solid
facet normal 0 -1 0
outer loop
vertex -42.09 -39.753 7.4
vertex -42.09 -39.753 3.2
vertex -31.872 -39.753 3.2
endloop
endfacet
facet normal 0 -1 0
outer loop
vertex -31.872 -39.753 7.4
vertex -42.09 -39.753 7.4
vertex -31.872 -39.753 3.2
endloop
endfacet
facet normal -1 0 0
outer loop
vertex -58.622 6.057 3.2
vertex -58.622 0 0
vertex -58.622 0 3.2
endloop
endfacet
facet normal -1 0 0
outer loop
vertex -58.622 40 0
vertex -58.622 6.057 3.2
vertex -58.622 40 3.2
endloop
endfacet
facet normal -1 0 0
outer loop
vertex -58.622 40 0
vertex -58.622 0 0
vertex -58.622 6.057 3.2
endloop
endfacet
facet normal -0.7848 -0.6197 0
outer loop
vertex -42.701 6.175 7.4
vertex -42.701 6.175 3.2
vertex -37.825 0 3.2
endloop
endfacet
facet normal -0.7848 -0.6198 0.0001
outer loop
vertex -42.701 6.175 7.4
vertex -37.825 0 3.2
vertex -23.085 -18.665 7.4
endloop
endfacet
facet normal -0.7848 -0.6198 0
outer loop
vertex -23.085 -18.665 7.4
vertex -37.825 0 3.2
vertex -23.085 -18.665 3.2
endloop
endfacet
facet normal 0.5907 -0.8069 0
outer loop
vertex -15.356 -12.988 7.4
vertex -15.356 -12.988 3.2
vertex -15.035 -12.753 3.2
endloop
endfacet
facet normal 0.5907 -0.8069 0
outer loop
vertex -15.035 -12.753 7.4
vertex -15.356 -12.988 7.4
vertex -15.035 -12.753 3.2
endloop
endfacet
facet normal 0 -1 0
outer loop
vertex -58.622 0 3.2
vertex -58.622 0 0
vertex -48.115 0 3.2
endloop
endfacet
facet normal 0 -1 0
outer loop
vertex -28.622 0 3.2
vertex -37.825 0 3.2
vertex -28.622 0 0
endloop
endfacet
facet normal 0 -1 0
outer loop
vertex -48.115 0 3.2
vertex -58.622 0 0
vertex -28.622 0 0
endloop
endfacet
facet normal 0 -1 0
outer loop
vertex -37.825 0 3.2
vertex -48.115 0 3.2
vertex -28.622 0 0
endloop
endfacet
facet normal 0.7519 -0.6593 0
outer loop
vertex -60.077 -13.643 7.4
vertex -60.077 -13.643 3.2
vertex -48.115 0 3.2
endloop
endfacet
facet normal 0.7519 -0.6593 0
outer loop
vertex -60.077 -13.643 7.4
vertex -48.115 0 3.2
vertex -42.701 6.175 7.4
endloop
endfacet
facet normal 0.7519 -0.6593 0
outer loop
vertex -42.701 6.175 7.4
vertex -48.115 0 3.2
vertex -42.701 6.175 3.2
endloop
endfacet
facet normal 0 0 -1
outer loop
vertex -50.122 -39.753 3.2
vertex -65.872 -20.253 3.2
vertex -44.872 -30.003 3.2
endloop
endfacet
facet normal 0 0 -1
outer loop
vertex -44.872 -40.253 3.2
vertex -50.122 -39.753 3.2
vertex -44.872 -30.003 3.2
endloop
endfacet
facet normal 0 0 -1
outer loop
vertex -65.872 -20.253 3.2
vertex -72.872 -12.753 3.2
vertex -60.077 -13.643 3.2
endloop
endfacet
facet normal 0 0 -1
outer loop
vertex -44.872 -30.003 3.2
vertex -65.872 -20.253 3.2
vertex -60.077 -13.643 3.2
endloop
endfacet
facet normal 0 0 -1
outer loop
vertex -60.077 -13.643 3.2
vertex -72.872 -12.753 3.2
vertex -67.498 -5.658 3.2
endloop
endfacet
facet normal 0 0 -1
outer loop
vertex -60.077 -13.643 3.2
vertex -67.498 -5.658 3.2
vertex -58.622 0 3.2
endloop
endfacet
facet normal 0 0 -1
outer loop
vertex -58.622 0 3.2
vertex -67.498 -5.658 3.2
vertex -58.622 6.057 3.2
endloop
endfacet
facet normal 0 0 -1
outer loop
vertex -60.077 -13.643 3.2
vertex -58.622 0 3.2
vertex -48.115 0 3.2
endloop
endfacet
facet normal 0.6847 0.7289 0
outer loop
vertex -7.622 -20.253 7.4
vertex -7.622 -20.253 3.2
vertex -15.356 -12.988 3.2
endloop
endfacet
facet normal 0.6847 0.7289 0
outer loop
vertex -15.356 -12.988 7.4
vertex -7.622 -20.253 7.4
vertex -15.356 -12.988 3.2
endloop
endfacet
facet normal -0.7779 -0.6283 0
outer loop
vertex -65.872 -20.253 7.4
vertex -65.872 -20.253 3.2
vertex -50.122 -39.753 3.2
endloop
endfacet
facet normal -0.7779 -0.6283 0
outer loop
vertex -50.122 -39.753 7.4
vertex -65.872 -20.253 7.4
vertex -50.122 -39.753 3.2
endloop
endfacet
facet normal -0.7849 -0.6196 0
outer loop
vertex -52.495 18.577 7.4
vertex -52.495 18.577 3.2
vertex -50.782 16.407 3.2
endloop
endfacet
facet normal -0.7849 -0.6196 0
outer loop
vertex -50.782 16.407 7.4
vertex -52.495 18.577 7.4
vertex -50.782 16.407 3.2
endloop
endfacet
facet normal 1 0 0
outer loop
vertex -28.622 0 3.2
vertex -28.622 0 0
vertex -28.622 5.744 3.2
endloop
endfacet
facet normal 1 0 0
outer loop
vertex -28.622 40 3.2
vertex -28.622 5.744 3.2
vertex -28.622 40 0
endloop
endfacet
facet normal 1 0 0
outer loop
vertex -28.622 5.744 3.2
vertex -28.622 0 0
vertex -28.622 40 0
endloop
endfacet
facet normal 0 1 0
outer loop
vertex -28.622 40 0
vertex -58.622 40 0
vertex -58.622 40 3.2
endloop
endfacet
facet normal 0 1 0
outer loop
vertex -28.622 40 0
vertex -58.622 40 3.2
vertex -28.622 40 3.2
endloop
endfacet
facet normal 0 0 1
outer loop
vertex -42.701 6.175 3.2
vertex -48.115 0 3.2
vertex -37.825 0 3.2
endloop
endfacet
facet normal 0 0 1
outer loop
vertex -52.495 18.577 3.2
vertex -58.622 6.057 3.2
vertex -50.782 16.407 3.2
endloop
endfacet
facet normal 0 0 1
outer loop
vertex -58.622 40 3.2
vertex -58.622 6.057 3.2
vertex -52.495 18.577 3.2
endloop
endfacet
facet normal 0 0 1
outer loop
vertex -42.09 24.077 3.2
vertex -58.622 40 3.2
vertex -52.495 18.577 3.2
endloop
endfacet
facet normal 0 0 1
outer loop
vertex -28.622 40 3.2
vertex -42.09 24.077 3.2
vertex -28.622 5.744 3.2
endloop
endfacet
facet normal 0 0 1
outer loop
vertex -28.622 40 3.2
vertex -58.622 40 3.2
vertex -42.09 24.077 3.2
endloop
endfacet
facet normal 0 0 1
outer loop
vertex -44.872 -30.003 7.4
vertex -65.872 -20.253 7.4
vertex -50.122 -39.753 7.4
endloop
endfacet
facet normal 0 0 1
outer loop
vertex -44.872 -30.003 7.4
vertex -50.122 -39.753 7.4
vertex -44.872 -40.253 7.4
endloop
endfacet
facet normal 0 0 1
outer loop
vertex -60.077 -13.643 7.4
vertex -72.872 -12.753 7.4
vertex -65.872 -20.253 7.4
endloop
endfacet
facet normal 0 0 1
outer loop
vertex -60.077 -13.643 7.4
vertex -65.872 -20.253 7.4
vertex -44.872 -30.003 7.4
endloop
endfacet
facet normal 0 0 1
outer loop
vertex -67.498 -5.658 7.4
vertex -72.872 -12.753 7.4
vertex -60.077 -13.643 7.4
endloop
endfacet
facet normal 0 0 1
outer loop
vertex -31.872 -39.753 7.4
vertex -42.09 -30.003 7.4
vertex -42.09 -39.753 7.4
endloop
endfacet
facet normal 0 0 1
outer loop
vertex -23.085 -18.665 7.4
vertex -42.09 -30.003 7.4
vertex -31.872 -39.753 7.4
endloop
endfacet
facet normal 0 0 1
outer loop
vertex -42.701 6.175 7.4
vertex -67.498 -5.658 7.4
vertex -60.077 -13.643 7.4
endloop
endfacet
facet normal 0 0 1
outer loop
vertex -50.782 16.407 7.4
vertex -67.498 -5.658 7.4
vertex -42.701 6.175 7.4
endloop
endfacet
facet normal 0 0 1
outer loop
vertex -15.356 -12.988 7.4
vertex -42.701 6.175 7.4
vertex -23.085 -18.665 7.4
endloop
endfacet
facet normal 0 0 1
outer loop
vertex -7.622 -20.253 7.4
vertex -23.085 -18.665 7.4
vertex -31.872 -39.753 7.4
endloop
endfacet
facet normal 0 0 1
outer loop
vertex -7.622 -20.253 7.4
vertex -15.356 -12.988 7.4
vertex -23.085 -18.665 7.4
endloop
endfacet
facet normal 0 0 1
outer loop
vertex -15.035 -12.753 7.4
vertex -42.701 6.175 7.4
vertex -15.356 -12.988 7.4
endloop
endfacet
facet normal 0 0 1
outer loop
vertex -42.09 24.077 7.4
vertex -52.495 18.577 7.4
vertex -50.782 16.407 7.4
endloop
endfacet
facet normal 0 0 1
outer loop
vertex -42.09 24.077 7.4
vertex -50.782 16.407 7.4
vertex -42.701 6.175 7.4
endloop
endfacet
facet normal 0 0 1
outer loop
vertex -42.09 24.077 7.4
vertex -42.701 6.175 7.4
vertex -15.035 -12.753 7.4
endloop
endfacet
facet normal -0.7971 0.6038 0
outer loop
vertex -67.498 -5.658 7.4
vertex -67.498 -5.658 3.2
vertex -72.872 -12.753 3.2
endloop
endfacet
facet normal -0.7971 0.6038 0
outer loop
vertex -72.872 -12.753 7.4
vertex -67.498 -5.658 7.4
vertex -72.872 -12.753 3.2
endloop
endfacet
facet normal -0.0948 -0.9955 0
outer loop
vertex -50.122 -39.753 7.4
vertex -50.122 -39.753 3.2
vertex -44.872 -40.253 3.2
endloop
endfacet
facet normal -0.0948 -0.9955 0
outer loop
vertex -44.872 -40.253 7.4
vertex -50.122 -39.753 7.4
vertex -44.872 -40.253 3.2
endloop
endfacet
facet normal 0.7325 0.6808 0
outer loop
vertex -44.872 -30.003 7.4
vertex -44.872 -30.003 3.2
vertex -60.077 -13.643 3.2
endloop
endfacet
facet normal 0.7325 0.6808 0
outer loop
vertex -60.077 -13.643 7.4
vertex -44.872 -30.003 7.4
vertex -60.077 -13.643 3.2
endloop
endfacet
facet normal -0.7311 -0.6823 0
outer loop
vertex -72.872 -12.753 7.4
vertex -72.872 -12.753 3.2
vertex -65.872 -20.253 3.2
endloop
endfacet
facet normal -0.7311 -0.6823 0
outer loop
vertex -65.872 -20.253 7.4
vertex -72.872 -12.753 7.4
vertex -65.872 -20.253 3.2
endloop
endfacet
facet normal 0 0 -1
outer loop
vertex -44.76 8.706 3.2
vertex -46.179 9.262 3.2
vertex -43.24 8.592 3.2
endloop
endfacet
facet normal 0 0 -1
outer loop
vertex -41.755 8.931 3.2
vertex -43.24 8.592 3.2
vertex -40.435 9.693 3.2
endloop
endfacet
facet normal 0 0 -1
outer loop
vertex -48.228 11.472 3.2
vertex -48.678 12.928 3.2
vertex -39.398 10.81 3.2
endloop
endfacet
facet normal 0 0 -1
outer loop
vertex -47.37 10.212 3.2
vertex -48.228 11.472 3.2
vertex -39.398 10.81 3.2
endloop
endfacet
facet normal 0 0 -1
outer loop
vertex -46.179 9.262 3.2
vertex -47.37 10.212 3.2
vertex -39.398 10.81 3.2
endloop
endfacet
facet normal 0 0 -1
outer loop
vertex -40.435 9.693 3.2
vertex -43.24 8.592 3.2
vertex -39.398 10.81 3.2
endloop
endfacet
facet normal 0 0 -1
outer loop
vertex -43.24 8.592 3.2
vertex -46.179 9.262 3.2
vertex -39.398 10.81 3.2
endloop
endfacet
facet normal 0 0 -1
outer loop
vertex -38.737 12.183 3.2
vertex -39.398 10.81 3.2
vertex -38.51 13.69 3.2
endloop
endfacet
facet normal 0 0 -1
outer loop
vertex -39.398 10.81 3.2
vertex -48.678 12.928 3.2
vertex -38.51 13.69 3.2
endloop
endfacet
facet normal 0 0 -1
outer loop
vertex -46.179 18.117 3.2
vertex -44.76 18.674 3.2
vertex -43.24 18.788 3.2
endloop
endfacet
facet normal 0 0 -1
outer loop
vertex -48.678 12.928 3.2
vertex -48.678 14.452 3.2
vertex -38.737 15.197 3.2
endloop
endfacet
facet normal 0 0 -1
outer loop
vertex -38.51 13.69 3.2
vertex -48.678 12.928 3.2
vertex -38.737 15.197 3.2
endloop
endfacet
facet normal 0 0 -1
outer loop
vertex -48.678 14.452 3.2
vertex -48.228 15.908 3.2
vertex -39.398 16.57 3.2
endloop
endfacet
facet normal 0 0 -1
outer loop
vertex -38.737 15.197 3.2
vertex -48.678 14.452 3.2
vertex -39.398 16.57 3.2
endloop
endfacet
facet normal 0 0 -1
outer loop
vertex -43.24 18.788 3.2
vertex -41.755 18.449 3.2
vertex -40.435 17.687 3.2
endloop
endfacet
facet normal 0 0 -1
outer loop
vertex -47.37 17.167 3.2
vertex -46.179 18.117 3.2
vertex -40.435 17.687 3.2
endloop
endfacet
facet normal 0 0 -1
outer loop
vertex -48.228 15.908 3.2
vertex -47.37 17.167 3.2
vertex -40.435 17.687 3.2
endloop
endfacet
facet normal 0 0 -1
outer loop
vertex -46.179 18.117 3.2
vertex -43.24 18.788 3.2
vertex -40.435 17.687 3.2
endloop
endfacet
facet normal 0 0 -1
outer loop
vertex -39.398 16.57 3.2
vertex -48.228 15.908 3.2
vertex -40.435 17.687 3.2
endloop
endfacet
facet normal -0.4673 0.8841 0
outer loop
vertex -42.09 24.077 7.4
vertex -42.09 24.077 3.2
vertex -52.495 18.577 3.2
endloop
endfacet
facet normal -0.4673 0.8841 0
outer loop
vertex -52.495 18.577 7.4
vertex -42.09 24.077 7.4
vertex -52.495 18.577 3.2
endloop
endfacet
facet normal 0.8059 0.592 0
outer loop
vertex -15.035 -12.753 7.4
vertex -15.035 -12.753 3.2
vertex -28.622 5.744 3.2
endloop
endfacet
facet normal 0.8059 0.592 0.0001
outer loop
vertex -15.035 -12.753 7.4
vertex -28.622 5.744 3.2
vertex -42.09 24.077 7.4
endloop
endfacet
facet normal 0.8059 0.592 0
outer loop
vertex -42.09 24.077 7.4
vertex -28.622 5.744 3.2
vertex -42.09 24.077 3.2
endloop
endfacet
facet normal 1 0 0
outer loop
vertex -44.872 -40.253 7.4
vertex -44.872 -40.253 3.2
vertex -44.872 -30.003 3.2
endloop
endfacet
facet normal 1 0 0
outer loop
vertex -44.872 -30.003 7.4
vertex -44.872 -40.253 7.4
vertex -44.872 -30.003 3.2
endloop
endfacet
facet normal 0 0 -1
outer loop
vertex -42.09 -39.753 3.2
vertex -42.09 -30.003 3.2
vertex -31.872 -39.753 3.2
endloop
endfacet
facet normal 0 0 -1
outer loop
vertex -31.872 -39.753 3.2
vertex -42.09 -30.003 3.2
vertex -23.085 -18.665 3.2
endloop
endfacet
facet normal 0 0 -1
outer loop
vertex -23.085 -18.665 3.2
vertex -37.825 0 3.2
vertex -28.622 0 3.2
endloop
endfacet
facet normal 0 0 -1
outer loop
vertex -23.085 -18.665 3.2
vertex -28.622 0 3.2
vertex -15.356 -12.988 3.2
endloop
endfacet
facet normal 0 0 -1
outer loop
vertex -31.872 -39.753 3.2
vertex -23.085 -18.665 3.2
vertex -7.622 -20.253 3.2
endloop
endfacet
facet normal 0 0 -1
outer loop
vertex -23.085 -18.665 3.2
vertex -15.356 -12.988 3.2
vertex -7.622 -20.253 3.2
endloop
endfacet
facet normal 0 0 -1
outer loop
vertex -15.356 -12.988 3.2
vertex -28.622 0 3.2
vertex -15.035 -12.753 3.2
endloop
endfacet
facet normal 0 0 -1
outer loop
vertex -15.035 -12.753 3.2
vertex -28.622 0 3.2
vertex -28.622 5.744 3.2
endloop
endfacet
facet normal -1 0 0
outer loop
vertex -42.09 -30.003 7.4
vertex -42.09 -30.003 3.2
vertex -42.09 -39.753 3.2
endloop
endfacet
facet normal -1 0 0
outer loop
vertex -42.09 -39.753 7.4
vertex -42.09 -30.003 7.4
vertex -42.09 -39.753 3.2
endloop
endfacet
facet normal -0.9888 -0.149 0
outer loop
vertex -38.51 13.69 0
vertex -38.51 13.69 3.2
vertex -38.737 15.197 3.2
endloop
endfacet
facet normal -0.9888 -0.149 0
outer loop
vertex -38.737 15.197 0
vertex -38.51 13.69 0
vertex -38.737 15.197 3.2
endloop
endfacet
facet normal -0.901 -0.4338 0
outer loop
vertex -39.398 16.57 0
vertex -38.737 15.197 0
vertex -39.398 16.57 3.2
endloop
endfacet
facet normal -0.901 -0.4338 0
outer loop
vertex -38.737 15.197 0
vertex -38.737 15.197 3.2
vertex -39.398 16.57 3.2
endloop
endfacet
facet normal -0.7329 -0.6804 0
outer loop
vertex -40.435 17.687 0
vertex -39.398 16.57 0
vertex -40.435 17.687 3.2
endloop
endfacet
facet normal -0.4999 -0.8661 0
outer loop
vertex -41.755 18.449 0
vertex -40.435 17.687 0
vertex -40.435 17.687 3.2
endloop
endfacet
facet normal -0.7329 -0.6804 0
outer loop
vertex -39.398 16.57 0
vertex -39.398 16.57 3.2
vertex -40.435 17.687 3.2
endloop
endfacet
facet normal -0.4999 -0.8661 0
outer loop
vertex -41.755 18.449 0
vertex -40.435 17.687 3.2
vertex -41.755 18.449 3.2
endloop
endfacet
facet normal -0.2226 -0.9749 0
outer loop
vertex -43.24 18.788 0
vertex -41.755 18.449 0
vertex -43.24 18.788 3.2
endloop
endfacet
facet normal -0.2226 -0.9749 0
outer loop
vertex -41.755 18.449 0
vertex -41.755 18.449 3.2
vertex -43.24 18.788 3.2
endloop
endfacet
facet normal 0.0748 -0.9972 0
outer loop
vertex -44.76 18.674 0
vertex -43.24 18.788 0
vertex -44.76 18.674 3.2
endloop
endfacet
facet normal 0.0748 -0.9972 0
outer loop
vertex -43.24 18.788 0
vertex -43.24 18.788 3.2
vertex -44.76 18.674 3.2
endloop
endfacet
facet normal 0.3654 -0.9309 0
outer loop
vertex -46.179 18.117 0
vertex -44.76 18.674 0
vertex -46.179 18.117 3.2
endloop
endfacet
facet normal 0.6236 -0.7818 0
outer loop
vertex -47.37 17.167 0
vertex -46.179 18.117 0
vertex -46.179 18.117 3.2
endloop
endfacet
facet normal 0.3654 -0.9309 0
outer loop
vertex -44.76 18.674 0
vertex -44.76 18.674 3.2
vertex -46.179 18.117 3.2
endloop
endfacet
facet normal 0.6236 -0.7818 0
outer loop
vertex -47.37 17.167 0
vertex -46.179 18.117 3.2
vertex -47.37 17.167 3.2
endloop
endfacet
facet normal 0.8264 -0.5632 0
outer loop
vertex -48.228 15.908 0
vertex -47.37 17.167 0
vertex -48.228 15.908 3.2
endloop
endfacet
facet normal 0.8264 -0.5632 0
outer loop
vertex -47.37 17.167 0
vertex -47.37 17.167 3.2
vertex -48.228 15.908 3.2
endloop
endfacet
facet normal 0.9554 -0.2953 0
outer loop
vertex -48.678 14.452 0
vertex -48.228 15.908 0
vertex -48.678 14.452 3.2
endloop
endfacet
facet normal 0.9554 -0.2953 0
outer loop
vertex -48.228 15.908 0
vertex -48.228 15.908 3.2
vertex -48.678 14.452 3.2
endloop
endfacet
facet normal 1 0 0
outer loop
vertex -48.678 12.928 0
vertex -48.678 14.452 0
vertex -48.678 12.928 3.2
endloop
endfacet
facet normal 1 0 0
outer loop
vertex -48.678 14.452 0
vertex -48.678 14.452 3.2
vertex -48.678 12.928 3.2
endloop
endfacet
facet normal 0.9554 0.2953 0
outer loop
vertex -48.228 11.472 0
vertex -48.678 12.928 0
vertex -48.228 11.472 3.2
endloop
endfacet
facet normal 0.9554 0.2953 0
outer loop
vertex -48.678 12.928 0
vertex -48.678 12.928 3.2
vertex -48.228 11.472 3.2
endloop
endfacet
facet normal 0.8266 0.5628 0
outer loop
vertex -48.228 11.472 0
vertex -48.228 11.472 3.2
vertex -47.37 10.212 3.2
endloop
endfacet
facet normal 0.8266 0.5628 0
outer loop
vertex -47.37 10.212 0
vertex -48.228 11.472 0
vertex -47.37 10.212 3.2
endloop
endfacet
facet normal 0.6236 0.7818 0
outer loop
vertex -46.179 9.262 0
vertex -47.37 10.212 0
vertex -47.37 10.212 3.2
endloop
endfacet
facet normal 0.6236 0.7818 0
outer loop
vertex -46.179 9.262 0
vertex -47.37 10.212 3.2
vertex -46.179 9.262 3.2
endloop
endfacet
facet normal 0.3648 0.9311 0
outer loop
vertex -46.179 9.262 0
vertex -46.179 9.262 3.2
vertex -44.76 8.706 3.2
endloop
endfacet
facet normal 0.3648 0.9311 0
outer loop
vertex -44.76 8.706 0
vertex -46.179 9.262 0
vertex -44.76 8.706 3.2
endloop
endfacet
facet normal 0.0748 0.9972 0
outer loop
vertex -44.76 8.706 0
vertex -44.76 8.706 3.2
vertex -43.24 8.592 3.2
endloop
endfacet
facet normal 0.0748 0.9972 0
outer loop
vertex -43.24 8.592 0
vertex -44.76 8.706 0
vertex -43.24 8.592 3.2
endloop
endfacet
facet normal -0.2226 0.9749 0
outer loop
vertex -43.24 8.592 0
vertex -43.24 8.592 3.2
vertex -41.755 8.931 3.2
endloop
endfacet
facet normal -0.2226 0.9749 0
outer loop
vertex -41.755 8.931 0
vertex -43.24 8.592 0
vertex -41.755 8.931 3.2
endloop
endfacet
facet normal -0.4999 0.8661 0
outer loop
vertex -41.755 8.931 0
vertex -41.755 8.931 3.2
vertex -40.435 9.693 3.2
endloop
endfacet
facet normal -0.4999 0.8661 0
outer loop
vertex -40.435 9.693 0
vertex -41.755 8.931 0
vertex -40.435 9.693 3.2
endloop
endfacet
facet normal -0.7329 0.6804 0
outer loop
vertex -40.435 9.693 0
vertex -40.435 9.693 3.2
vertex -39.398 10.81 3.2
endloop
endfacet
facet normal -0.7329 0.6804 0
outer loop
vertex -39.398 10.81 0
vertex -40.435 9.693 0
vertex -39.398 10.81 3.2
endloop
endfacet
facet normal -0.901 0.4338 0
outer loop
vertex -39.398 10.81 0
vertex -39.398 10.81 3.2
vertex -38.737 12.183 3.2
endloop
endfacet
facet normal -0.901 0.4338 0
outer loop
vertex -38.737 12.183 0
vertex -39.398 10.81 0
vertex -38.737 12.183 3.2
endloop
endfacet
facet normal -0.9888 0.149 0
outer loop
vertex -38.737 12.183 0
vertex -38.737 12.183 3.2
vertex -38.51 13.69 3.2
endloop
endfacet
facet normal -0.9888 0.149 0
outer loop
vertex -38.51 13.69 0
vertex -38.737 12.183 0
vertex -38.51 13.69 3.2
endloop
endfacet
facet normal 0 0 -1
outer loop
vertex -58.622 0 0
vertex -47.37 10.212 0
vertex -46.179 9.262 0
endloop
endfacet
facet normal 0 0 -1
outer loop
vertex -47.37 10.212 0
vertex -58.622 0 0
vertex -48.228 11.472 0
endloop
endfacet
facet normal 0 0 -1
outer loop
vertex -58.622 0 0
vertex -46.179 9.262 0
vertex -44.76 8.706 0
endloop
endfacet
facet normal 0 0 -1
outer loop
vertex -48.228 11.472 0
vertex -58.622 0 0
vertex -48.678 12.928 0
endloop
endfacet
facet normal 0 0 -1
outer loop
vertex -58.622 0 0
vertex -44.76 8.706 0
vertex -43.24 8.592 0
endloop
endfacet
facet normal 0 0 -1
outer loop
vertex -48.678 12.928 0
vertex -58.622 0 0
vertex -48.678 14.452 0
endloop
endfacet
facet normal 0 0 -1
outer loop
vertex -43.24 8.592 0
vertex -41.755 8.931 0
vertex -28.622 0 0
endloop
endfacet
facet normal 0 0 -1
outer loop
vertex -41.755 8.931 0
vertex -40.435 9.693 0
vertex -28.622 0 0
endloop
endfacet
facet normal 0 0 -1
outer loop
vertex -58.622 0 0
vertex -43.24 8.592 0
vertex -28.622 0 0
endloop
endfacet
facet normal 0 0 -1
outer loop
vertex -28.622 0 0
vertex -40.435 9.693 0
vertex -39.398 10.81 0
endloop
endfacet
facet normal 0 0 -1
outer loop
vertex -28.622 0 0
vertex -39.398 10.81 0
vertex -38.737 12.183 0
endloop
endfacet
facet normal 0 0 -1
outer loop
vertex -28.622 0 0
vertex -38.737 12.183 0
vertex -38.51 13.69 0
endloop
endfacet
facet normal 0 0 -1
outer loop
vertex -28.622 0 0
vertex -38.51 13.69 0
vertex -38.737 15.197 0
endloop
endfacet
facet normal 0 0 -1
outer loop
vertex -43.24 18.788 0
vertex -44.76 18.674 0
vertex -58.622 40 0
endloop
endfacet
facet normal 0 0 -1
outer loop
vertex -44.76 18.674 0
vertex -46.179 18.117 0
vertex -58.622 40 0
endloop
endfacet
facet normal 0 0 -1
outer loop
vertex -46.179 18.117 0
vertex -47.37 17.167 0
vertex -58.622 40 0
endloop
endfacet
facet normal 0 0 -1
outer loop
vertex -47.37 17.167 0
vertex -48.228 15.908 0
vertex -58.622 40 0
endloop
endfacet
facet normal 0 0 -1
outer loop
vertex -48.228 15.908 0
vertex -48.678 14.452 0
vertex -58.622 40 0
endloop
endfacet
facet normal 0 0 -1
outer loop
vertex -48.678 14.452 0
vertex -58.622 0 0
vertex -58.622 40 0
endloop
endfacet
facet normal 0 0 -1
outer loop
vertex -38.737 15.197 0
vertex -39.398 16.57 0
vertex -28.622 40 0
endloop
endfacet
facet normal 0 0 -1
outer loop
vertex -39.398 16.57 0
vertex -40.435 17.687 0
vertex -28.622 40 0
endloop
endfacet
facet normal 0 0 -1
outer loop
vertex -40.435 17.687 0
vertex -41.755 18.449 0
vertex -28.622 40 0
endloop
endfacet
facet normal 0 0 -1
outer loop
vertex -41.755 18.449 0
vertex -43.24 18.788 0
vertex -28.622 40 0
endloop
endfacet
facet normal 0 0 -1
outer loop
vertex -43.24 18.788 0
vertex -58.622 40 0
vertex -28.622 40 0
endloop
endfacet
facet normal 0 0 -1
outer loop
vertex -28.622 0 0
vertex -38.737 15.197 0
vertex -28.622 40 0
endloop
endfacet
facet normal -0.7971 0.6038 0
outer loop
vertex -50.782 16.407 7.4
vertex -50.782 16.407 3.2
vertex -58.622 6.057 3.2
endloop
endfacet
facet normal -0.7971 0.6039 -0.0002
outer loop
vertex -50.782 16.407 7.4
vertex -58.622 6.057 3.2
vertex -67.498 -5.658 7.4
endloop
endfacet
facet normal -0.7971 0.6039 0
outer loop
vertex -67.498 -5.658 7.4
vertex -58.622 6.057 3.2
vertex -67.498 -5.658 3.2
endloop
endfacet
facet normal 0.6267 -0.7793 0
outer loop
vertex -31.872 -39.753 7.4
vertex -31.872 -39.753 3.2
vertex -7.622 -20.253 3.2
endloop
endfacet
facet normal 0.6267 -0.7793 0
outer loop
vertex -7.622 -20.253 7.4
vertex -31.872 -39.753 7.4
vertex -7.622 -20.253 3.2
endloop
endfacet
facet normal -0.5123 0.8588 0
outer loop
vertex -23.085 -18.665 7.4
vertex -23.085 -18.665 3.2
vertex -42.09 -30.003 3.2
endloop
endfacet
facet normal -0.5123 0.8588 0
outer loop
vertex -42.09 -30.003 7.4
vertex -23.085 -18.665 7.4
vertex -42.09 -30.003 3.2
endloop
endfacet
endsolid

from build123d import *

# Parameters (mm, degrees)
F0_W     = 30
F0_H     = 40
F1_DEPTH = 3.2
F2_R     = 5.11227941
F3_DEPTH = 25
F5_DEPTH = 4.2


with BuildPart() as f1:
    # F0 (on Top) → F1 (new body)
    with BuildSketch(Plane.XY):
        with Locations((-43.6224012077, 20)):
            Rectangle(F0_W, F0_H)
    extrude(amount=F1_DEPTH)

    # F2 (on face) → F3 (cut)
    with BuildSketch(Plane.XY.offset(3.2)):
        with Locations((-43.6224012077, 13.6897208655)):
            Circle(F2_R)
    extrude(amount=-F3_DEPTH, mode=Mode.SUBTRACT)

    # F4 (on face) → F5 (join)
    with BuildSketch(Plane.XY.offset(3.2)):
        Polygon((-60.0767214389, -13.6426556282), (-67.4975478184, -5.6577981007), (-72.8724002838, -12.7526037395), (-65.8724009991, -20.2526040375), align=None)
        Polygon((-50.7815668435, 16.4072979817), (-67.4975478184, -5.6577981007), (-60.0767214389, -13.6426556282), (-42.700756127, 6.1745604691), align=None)
        Polygon((-52.4952933192, 18.5773912817), (-50.7815668435, 16.4072979817), (-47.8724017739, 20.2473960817), (-35.6223993003, 14.2473969609), (-42.700756127, 6.1745604691), (-23.0845756663, -18.6654256037), (-15.3557008339, -12.9879858125), (-15.0352679193, -12.7526037395), (-42.0897305012, 24.077475071), align=None)
        Polygon((-47.8724017739, 20.2473960817), (-50.7815668435, 16.4072979817), (-42.700756127, 6.1745604691), (-35.6223993003, 14.2473969609), align=None)
        Polygon((-44.8723994195, -30.00260517), (-60.0767214389, -13.6426556282), (-65.8724009991, -20.2526040375), (-50.1223988831, -39.7526025772), (-44.8723994195, -40.2526035905), align=None)
        Polygon((-15.3557008339, -12.9879858125), (-23.0845756663, -18.6654256037), (-42.0897305012, -30.00260517), (-42.0897305012, -39.7526025772), (-31.8723991513, -39.7526025772), (-7.6223979704, -20.2526040375), align=None)
    extrude(amount=F5_DEPTH)


solid = f1.part
